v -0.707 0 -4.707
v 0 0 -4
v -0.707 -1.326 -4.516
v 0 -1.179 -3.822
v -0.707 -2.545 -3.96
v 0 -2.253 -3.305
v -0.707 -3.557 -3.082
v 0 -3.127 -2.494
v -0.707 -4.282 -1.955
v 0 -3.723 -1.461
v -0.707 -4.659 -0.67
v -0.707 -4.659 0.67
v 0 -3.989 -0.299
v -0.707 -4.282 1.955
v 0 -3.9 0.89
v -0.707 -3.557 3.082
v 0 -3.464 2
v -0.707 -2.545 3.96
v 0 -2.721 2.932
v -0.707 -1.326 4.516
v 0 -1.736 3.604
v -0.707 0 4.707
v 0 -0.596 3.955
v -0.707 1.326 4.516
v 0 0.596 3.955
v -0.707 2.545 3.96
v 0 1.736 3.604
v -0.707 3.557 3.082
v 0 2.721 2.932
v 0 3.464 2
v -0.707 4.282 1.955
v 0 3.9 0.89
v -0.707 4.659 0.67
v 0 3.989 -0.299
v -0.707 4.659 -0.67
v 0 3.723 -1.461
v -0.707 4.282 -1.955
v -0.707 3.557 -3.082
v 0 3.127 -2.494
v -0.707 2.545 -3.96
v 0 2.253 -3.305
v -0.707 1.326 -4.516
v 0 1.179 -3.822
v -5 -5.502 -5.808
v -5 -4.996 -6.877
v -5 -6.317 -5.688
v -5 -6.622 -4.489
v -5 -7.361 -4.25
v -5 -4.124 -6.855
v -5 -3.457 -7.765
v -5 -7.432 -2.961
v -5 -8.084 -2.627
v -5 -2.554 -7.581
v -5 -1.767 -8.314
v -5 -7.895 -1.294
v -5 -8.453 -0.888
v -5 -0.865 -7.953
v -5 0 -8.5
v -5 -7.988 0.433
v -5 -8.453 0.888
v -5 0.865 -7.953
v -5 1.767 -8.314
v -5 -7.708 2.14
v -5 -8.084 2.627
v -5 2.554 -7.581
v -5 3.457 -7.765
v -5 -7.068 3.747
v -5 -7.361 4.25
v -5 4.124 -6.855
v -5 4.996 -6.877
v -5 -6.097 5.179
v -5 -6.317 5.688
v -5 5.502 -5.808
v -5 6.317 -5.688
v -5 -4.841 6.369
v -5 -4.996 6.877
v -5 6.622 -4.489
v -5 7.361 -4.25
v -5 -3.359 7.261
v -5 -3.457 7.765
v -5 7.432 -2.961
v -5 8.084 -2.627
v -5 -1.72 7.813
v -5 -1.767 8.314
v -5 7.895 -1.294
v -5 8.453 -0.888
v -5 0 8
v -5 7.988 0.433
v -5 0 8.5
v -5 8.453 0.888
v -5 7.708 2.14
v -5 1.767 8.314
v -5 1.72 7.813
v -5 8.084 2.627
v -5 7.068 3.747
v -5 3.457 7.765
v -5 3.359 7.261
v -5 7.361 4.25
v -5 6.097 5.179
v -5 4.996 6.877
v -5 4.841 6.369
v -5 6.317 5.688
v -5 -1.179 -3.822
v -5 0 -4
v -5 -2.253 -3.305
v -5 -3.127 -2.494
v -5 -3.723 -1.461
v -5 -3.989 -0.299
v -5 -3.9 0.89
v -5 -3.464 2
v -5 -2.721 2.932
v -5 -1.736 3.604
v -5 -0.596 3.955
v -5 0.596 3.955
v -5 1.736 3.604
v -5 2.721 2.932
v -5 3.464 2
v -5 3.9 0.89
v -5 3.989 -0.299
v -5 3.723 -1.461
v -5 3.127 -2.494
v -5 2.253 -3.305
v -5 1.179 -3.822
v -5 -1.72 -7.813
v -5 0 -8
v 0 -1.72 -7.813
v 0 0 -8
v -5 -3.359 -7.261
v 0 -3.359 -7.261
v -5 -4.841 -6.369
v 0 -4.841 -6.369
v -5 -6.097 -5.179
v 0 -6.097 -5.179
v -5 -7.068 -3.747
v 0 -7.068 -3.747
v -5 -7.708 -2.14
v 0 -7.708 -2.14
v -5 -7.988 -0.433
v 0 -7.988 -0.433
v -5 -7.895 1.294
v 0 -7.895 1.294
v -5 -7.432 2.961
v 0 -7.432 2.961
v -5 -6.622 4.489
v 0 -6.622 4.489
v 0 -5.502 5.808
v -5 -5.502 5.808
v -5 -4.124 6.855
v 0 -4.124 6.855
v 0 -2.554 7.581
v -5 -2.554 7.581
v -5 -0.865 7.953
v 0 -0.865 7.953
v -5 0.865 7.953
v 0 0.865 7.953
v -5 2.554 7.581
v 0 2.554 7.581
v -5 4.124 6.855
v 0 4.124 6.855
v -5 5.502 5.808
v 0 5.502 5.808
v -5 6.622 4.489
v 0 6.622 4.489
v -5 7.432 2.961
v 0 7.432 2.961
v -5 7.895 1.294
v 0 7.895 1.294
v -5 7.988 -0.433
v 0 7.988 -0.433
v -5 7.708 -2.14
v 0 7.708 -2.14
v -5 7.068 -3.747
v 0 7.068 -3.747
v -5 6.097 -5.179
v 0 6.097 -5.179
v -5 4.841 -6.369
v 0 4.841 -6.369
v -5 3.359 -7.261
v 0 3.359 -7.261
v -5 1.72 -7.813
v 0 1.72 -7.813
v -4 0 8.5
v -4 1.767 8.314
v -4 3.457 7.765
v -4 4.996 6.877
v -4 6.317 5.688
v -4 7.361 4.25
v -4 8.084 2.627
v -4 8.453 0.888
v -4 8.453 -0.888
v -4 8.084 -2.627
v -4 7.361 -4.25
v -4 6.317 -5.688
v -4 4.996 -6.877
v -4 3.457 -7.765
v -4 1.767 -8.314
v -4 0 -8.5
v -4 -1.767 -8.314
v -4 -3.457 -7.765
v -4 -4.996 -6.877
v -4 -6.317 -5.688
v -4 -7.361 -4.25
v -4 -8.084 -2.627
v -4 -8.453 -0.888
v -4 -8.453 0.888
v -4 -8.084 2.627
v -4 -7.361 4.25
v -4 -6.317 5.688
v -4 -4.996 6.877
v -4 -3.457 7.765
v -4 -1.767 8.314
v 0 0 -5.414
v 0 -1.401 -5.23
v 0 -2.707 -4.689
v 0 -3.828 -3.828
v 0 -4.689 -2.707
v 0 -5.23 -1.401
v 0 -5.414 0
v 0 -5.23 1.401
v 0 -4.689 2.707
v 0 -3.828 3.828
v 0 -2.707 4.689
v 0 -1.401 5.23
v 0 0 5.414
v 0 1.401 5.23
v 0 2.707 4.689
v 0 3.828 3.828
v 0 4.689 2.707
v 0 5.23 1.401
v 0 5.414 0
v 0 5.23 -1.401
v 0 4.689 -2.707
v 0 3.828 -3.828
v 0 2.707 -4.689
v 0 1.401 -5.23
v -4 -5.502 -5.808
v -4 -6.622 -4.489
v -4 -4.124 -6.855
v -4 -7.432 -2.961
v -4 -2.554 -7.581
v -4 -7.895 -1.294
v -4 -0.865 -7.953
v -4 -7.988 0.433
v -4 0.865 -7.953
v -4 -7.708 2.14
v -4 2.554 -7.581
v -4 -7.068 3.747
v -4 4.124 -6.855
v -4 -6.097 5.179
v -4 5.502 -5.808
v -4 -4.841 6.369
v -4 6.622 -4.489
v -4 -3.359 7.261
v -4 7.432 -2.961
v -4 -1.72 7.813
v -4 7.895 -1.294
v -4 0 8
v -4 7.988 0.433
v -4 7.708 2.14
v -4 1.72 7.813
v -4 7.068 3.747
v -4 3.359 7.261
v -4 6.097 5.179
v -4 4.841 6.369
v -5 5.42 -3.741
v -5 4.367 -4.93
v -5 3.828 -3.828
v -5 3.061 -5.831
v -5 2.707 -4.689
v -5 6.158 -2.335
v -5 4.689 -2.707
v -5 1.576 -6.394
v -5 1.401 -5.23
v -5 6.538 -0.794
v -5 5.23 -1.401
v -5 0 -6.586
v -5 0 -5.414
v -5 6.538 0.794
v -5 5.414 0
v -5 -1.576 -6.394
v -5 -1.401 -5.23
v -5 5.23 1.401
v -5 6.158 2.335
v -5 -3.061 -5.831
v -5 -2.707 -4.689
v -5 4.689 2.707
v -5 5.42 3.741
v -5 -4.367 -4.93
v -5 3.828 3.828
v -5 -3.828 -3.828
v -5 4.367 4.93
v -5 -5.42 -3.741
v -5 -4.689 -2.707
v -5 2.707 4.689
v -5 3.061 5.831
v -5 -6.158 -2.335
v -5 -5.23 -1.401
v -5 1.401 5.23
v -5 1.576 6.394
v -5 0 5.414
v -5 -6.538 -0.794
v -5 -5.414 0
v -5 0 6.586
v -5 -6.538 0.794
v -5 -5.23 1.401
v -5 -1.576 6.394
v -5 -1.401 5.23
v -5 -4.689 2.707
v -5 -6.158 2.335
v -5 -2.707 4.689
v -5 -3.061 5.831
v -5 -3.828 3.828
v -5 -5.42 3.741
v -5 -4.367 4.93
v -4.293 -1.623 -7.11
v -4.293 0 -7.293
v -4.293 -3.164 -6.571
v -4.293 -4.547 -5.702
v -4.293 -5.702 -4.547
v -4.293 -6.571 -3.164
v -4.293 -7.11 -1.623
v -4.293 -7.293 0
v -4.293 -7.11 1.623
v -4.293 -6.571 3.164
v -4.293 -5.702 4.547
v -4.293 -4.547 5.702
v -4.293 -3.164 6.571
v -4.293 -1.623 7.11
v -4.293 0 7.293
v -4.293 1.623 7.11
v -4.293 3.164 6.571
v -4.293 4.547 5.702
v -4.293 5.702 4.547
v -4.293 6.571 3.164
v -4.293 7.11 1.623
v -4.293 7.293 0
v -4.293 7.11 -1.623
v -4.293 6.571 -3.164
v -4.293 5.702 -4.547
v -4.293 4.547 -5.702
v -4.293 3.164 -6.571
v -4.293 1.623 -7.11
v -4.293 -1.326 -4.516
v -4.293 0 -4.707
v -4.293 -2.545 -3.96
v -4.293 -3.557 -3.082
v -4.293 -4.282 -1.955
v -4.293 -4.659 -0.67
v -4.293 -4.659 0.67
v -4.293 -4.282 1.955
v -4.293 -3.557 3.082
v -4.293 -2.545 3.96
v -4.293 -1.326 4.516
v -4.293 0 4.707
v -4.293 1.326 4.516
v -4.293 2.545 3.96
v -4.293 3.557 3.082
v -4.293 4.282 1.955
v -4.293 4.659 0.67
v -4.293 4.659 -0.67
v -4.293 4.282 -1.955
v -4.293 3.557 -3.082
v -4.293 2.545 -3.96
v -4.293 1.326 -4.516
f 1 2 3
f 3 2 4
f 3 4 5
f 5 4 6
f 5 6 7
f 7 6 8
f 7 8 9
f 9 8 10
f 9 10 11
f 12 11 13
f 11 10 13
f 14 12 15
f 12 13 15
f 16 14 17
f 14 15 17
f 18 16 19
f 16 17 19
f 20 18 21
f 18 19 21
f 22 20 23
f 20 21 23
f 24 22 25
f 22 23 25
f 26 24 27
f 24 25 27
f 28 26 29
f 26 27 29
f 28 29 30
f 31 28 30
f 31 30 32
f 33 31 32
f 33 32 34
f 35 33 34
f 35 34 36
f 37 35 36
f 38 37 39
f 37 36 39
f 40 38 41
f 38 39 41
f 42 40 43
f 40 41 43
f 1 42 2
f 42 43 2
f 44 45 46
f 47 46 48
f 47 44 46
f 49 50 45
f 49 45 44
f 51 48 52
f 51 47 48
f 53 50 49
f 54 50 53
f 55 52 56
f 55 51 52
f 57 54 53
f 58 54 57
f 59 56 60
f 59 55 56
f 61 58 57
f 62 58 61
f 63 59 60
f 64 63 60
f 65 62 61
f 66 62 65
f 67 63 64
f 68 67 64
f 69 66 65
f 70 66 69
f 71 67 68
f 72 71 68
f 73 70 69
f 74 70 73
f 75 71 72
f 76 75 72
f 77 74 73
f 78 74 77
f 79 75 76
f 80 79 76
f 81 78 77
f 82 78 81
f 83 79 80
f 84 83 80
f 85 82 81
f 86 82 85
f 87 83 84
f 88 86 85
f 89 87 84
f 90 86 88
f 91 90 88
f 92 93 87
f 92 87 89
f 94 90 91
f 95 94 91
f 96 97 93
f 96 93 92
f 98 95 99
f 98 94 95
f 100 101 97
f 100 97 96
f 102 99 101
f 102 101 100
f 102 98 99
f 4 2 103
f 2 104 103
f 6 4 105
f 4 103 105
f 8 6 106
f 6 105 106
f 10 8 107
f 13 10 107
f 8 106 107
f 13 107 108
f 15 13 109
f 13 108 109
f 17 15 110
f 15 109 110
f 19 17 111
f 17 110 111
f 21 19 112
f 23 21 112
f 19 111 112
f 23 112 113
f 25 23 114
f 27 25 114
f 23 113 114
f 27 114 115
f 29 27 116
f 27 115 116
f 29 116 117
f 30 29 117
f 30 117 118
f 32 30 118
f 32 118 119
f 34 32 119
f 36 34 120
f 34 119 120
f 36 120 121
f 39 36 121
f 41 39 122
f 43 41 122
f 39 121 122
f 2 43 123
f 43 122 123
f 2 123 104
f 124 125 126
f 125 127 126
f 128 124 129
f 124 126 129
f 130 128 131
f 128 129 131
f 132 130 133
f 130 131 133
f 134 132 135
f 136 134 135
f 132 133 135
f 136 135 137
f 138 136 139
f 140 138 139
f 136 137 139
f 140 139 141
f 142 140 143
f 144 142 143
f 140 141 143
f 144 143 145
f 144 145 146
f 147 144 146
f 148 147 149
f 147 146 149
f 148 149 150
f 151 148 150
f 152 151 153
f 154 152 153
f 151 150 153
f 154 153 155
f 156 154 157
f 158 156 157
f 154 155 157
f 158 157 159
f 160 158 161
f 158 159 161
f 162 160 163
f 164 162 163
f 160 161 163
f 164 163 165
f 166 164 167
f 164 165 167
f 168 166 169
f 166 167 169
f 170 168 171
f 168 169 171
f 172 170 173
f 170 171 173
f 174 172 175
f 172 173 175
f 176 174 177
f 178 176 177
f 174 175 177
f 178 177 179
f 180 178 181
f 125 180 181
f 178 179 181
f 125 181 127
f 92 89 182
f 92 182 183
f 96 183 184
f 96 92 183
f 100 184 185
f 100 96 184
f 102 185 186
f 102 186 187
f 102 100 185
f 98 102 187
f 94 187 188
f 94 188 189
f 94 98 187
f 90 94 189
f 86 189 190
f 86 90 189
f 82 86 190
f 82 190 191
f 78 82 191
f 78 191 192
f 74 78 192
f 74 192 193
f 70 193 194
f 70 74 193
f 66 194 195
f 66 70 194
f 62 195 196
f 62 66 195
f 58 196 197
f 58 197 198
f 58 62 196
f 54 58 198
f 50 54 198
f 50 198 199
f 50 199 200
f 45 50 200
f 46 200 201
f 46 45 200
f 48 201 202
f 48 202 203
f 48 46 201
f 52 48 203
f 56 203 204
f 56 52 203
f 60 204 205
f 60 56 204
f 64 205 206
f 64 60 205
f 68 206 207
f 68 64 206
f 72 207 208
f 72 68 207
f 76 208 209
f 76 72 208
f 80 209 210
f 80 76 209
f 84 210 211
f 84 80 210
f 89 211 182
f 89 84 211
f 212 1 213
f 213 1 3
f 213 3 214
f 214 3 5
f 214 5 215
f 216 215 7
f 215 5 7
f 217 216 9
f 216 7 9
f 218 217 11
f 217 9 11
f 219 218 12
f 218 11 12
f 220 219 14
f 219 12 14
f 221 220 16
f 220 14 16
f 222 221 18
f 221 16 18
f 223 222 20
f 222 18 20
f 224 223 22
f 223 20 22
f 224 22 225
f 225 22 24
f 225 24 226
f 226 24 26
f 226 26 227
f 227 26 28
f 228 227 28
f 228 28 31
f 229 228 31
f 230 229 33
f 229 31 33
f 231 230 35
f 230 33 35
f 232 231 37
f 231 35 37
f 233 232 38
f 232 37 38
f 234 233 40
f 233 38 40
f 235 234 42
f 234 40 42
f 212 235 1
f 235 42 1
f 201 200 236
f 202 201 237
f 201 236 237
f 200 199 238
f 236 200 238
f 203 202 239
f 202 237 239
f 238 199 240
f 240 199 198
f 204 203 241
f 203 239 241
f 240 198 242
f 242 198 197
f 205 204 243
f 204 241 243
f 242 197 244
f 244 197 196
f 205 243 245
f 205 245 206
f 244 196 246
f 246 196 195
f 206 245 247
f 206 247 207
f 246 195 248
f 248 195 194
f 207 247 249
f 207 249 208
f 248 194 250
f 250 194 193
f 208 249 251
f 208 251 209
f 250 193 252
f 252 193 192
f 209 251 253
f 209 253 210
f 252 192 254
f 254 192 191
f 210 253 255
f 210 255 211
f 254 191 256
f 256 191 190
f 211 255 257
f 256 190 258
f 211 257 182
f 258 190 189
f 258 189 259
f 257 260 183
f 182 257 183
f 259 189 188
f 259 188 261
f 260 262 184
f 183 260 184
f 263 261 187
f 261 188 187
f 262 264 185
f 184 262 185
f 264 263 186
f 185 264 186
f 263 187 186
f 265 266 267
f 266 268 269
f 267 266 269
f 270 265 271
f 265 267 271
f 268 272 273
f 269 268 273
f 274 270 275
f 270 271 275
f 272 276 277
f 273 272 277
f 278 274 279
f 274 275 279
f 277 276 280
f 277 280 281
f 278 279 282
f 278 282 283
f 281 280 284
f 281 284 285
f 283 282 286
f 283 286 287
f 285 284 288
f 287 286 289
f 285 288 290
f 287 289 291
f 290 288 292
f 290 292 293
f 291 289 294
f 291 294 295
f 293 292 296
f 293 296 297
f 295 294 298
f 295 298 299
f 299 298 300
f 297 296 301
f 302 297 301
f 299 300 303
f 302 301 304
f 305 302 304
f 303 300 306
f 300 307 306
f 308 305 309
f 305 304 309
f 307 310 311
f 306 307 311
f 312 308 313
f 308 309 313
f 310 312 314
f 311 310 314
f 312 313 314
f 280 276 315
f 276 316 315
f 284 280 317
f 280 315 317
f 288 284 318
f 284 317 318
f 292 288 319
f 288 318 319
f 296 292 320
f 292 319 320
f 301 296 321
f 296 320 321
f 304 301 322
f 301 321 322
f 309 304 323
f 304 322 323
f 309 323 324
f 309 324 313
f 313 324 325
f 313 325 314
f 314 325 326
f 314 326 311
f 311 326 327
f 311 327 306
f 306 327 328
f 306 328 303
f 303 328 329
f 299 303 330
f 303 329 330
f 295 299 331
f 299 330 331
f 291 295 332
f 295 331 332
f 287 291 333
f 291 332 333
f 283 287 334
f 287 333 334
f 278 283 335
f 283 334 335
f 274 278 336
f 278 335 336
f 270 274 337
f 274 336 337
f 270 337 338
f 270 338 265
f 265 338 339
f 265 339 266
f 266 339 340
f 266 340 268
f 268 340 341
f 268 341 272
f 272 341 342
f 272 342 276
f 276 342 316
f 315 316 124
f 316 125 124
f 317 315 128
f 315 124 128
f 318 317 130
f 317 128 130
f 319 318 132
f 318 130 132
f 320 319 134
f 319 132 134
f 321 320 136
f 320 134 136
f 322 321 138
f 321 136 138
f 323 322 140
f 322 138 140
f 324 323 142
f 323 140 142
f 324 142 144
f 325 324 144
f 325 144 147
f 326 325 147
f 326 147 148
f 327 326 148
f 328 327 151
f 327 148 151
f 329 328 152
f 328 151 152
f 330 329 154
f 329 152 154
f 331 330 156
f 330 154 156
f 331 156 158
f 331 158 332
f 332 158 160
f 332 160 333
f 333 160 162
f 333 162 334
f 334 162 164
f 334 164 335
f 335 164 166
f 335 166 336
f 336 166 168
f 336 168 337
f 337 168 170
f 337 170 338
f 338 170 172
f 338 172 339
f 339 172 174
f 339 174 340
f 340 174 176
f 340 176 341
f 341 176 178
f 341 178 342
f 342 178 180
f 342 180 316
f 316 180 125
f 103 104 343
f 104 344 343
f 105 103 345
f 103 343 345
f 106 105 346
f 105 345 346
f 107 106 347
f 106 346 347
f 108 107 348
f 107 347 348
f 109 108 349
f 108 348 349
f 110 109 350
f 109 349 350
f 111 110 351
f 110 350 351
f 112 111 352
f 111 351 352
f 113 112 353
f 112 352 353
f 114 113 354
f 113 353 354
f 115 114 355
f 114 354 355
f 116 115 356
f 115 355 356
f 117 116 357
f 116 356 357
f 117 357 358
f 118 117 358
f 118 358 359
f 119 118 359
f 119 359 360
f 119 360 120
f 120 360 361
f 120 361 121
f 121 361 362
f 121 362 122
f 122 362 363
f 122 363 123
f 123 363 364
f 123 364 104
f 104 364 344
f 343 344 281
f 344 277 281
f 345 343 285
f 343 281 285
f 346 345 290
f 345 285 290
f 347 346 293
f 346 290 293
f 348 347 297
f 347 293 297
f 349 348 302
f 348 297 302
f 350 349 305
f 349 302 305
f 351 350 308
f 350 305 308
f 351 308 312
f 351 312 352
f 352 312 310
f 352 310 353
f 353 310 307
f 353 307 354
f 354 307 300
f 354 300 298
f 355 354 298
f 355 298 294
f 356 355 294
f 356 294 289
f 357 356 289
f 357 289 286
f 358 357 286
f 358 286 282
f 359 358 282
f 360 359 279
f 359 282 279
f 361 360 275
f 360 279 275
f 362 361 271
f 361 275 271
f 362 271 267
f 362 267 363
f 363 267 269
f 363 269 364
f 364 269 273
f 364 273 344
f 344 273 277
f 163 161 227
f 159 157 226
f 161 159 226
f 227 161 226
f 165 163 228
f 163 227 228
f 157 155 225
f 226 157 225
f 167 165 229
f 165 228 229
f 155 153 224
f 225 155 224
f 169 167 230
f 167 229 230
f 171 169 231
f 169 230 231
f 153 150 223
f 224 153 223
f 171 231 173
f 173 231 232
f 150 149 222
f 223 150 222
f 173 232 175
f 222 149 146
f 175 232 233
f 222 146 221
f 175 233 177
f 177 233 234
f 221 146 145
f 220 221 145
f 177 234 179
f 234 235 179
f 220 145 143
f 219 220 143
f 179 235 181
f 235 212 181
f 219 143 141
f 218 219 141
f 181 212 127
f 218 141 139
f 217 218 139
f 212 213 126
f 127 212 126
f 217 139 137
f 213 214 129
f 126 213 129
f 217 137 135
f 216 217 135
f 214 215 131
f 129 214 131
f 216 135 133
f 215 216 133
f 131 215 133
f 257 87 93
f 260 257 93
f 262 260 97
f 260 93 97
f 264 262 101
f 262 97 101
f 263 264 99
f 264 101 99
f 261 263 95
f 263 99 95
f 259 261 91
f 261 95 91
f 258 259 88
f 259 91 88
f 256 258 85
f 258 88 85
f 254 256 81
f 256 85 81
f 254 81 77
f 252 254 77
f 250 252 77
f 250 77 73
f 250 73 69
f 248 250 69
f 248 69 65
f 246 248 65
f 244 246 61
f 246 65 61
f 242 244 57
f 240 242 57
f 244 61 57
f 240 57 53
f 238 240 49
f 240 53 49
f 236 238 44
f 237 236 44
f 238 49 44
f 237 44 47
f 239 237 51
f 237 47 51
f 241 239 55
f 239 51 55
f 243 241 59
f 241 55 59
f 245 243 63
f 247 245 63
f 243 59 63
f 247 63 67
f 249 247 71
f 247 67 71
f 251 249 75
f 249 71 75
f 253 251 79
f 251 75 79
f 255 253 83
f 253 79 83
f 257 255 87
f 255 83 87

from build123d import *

# Parameters (mm, degrees)
SKETCH_2_R      = 8.5
SKETCH_2_R_2    = 8
EXTRUDE_1_DEPTH = 1


with BuildPart() as part:
    # 草图1 → 旋转1 (revolve)
    with BuildSketch(Plane(origin=(0, 0, 0), x_dir=(1, 0, 0), z_dir=(0, 1, 0)), mode=Mode.PRIVATE) as revolve_1_sk:
        Polygon((0, -4), (-5, -4), (-4.292893219, -4.707106781), (-5, -5.414213562), (-5, -6.585786438), (-4.292893219, -7.292893219), (-5, -8), (0, -8), (0, -5.414213562), (-0.707106781, -4.707106781), align=None)
    revolve(revolve_1_sk.sketch.rotate(Axis((0, 0, 0), (-1, 0, 0)), 180), axis=Axis((0, 0, 0), (-1, 0, 0)))


with BuildPart() as body_2:
    # 草图2 → 凸台-拉伸1 (new body)
    with BuildSketch(Plane.ZY.offset(5)):
        Circle(SKETCH_2_R)
        Circle(SKETCH_2_R_2, mode=Mode.SUBTRACT)
    extrude(amount=-EXTRUDE_1_DEPTH)


solid = Compound([part.part, body_2.part])
